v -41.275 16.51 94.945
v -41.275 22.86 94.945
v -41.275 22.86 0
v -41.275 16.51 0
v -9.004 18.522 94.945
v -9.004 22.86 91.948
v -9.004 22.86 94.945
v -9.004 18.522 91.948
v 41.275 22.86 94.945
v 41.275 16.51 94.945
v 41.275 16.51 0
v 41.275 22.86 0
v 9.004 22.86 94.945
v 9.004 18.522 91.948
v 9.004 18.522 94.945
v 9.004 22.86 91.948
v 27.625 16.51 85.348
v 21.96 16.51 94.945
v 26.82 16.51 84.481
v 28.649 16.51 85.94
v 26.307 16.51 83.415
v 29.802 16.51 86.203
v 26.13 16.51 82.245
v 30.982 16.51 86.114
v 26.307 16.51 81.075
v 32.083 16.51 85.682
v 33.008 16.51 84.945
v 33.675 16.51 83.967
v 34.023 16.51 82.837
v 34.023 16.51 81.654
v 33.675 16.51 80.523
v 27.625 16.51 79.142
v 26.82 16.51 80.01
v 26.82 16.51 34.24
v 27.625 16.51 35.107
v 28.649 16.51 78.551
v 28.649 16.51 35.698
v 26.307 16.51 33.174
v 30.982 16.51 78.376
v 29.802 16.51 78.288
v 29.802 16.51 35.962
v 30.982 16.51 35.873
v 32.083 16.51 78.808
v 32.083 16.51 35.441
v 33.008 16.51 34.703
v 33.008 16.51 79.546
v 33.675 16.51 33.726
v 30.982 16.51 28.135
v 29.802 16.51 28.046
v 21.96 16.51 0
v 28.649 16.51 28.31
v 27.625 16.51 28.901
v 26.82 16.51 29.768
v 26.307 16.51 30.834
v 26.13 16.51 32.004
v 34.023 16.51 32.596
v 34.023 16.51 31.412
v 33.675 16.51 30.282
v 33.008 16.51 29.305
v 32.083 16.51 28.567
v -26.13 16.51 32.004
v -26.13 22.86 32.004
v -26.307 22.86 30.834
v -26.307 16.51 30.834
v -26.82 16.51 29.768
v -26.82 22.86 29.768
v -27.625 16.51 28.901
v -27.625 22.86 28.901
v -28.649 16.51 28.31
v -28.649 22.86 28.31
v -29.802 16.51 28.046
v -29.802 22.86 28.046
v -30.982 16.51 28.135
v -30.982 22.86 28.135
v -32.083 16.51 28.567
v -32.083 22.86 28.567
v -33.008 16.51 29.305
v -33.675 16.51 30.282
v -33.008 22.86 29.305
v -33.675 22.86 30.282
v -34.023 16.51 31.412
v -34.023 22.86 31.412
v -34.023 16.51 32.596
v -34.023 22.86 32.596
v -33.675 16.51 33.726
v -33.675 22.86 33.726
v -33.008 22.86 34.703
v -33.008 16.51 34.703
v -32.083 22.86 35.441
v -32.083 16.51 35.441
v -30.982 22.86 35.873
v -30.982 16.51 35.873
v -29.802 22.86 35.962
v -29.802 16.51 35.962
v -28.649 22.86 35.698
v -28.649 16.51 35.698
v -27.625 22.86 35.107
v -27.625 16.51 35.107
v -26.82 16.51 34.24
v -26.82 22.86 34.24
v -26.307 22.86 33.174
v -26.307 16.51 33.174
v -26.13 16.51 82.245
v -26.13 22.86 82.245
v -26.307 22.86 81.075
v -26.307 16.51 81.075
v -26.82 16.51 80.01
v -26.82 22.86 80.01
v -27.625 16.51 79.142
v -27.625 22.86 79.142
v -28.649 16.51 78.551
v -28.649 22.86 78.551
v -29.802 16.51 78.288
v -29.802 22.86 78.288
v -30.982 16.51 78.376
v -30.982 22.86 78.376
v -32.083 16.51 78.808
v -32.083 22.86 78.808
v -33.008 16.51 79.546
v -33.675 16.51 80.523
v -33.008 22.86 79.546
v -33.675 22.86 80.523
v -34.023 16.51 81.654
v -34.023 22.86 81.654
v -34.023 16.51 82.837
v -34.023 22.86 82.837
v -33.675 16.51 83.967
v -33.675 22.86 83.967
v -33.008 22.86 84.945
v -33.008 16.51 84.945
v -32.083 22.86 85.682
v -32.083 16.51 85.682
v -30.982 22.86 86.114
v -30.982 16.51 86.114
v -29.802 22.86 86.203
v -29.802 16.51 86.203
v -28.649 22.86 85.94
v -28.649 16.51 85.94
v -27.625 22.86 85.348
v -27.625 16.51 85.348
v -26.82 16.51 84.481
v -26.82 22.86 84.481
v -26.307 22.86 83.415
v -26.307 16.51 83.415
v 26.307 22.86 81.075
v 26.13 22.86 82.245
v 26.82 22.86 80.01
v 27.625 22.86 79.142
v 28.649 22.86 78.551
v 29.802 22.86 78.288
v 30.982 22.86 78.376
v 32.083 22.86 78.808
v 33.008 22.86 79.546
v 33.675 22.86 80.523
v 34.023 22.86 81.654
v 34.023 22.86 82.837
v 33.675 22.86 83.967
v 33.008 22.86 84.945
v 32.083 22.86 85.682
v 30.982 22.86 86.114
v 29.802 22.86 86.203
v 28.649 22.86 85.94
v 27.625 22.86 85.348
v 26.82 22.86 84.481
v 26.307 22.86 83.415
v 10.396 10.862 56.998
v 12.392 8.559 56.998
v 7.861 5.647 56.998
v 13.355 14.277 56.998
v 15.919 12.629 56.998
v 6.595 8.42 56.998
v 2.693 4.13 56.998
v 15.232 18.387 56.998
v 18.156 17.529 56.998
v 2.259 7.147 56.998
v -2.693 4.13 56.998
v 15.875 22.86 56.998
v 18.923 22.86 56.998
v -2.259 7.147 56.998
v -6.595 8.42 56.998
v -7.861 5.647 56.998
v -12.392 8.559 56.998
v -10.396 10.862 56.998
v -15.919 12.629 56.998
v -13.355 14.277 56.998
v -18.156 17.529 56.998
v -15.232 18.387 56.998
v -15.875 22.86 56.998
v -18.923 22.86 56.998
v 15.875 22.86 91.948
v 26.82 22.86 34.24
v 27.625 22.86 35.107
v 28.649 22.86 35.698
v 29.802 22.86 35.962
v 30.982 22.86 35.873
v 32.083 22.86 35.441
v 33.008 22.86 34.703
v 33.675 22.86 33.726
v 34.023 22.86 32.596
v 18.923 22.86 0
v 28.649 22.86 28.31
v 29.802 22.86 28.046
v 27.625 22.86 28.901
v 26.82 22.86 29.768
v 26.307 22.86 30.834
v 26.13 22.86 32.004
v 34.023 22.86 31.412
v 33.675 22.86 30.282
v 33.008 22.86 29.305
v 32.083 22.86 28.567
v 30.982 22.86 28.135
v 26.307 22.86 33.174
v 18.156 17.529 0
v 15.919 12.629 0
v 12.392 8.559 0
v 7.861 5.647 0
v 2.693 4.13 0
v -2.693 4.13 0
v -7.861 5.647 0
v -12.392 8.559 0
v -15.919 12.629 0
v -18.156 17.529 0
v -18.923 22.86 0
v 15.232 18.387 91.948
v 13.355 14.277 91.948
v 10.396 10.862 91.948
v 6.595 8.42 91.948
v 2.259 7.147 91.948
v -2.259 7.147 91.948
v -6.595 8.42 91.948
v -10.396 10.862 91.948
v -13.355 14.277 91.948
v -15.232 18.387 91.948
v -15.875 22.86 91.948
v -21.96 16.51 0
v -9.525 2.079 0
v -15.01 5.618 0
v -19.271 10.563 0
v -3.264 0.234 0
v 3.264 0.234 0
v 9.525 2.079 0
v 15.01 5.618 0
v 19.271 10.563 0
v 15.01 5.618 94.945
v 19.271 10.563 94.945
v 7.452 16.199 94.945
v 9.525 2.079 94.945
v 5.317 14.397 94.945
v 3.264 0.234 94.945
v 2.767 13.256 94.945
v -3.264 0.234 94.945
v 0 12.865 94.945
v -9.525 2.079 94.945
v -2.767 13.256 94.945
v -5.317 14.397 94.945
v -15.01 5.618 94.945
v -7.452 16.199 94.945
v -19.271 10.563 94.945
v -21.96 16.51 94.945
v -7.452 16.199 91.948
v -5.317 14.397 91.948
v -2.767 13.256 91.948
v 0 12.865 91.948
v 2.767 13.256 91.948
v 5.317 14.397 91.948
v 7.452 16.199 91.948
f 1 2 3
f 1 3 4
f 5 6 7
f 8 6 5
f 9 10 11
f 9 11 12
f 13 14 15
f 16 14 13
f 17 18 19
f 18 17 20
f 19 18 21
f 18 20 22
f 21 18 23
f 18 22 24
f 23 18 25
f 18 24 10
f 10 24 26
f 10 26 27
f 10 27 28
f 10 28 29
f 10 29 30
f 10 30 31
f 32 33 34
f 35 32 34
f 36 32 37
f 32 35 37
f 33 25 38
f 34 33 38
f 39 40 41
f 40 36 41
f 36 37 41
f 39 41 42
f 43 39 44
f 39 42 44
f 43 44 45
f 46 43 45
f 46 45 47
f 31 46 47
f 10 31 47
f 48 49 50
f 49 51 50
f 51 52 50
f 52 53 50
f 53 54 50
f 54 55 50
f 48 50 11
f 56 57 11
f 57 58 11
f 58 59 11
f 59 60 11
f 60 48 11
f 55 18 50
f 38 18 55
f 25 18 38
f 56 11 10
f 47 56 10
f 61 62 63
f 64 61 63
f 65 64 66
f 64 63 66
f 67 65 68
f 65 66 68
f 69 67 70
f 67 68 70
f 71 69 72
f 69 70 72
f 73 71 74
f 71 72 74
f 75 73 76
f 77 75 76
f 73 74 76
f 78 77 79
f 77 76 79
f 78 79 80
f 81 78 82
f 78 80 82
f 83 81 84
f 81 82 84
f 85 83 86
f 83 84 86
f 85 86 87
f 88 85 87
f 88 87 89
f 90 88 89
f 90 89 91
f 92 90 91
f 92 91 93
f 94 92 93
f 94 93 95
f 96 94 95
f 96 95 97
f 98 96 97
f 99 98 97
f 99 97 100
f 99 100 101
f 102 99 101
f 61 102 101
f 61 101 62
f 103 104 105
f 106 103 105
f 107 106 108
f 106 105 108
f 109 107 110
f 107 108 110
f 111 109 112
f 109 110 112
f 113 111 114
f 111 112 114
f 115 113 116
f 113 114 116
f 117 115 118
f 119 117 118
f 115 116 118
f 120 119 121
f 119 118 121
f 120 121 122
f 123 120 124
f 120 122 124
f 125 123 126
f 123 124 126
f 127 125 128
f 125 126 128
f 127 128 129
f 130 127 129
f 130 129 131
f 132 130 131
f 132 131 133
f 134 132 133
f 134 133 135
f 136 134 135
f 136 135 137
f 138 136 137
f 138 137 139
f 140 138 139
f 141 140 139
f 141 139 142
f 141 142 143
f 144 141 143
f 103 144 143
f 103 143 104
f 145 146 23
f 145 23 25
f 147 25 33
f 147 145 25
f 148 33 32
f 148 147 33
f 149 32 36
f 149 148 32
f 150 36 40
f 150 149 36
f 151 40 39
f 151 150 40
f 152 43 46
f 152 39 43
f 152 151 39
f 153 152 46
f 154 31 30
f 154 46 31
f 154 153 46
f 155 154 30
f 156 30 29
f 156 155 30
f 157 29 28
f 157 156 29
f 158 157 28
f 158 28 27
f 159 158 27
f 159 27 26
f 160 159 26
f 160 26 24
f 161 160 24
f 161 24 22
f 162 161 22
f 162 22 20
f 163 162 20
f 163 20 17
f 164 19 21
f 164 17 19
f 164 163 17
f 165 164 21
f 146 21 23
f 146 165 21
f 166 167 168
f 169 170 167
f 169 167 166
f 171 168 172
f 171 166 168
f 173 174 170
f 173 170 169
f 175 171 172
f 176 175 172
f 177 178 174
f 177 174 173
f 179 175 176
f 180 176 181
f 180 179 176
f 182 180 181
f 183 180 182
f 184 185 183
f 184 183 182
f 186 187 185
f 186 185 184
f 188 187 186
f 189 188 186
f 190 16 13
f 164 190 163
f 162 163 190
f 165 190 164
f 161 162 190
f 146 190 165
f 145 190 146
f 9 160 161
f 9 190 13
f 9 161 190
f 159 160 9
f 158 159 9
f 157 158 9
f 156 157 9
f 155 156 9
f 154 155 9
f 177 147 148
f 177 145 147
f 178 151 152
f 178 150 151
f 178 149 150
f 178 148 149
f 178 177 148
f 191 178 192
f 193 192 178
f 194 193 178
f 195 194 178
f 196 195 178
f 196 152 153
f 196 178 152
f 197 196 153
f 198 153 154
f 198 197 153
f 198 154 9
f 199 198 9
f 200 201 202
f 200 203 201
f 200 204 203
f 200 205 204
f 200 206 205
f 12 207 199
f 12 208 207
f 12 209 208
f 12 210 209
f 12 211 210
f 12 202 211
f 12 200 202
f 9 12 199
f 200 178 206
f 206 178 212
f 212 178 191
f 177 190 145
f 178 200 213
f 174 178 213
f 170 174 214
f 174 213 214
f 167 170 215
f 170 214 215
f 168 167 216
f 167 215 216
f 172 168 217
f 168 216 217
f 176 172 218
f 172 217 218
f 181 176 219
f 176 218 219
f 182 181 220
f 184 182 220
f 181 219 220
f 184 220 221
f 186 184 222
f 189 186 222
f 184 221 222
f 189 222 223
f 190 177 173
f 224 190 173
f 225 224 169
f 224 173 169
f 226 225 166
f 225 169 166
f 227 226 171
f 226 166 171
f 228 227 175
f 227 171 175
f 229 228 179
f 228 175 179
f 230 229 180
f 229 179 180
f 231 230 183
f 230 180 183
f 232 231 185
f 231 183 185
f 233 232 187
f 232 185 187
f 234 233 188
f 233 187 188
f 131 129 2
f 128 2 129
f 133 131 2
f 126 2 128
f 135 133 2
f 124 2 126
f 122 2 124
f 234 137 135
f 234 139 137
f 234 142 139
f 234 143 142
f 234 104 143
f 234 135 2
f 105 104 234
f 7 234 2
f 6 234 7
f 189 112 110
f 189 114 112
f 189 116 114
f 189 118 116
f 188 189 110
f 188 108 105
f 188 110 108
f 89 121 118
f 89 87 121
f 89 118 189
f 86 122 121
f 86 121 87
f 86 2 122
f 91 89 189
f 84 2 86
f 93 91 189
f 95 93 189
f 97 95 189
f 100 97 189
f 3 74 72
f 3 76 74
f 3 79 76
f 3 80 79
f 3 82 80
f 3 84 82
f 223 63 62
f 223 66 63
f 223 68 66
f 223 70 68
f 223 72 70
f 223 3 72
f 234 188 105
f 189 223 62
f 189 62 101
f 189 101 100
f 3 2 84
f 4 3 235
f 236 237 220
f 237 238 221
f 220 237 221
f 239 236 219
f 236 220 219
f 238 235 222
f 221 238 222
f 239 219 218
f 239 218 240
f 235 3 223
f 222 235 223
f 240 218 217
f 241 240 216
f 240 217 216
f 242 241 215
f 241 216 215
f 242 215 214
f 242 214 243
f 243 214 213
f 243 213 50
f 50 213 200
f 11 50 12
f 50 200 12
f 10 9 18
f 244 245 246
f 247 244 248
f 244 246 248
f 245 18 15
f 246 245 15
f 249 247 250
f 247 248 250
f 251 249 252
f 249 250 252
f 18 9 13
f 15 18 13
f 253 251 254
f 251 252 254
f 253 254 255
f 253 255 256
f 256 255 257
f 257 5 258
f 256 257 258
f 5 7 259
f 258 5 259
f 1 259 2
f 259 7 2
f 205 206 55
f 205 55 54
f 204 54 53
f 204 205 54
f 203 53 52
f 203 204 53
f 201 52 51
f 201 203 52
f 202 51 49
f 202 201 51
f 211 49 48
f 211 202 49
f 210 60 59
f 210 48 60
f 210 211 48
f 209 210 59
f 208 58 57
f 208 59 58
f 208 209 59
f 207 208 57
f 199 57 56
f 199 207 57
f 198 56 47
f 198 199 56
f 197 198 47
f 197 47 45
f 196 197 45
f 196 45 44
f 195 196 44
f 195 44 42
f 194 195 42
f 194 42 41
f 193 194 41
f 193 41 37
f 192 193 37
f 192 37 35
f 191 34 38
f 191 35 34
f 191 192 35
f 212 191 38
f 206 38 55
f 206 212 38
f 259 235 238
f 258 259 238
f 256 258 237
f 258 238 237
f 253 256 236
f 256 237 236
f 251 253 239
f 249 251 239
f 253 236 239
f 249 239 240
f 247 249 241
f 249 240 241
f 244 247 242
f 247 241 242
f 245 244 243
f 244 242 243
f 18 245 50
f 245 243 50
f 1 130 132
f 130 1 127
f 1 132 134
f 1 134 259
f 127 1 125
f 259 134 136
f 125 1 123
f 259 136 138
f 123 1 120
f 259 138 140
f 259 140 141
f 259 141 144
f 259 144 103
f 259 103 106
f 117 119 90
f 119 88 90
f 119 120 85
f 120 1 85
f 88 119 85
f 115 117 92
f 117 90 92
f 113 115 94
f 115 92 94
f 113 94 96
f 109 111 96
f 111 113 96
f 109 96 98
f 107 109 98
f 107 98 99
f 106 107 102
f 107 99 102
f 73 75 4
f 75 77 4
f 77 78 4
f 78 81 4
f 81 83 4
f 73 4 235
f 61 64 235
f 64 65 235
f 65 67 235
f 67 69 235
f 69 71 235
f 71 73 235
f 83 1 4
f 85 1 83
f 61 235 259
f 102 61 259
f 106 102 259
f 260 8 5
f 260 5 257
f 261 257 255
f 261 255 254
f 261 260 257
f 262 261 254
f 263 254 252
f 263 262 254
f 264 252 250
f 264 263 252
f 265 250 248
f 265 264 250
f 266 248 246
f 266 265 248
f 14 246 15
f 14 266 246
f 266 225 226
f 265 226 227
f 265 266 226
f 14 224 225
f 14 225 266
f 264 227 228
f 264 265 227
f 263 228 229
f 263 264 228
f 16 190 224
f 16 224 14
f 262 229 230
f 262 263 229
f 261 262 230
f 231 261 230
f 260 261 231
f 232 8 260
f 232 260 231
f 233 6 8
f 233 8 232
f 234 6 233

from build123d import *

# Parameters (mm, degrees)
BOSS_EXTRUDE1_DEPTH = 94.9452
SKETCH2_R           = 18.923
CUT_EXTRUDE1_DEPTH  = 56.9976
BOSS_EXTRUDE2_START = -2.9972
BOSS_EXTRUDE2_DEPTH = 2.9972
HOLE1_D             = 7.9375


with BuildPart() as part:
    # Sketch1 → Boss-Extrude1 (new body)
    with BuildSketch(Plane.XY):
        with BuildLine():
            Line((21.960352912, 16.51), (41.275, 16.51))
            Line((41.275, 16.51), (41.275, 22.86))
            Line((41.275, 22.86), (15.875, 22.86))
            ThreePointArc((15.875, 22.86), (0, 6.985), (-15.875, 22.86))
            Line((-15.875, 22.86), (-41.275, 22.86))
            Line((-41.275, 22.86), (-41.275, 16.51))
            Line((-41.275, 16.51), (-21.960352912, 16.51))
            ThreePointArc((-21.960352912, 16.51), (0, 0), (21.960352912, 16.51))
        make_face()
    extrude(amount=BOSS_EXTRUDE1_DEPTH)

    # Sketch2 → Cut-Extrude1 (cut)
    with BuildSketch(Plane(origin=(0, 0, 0), x_dir=(-1, 0, 0), z_dir=(0, 0, -1))):
        with Locations((0, 22.86)):
            Circle(SKETCH2_R)
    extrude(amount=-CUT_EXTRUDE1_DEPTH, mode=Mode.SUBTRACT)

    # Sketch3 → Boss-Extrude2 (add)
    with BuildSketch(Plane.XY.offset(94.9452).offset(BOSS_EXTRUDE2_START)):
        with BuildLine():
            Line((-15.875, 22.86), (-9.0043, 22.86))
            Line((-9.0043, 22.86), (-9.0043, 18.521727588))
            ThreePointArc((-9.0043, 18.521727588), (0, 12.8651), (9.0043, 18.521727588))
            Line((9.0043, 18.521727588), (9.0043, 22.86))
            Line((9.0043, 22.86), (15.875, 22.86))
            ThreePointArc((15.875, 22.86), (0, 6.985), (-15.875, 22.86))
        make_face()
    extrude(amount=BOSS_EXTRUDE2_DEPTH)

    # Hole1 (through all)
    with Locations(Plane(origin=(0, 16.51, 0), x_dir=(-1, 0, 0), z_dir=(0, -1, 0))):
        with Locations((30.099, -32.004), (30.099, -82.2452)):
            hole1 = Hole(HOLE1_D / 2)

    # Mirror1: Hole1 across plane
    add(hole1.mirror(Plane(origin=(0, 0, 0), x_dir=(0, 0, 1), z_dir=(1, 0, 0))), mode=Mode.SUBTRACT)


solid = part.part
